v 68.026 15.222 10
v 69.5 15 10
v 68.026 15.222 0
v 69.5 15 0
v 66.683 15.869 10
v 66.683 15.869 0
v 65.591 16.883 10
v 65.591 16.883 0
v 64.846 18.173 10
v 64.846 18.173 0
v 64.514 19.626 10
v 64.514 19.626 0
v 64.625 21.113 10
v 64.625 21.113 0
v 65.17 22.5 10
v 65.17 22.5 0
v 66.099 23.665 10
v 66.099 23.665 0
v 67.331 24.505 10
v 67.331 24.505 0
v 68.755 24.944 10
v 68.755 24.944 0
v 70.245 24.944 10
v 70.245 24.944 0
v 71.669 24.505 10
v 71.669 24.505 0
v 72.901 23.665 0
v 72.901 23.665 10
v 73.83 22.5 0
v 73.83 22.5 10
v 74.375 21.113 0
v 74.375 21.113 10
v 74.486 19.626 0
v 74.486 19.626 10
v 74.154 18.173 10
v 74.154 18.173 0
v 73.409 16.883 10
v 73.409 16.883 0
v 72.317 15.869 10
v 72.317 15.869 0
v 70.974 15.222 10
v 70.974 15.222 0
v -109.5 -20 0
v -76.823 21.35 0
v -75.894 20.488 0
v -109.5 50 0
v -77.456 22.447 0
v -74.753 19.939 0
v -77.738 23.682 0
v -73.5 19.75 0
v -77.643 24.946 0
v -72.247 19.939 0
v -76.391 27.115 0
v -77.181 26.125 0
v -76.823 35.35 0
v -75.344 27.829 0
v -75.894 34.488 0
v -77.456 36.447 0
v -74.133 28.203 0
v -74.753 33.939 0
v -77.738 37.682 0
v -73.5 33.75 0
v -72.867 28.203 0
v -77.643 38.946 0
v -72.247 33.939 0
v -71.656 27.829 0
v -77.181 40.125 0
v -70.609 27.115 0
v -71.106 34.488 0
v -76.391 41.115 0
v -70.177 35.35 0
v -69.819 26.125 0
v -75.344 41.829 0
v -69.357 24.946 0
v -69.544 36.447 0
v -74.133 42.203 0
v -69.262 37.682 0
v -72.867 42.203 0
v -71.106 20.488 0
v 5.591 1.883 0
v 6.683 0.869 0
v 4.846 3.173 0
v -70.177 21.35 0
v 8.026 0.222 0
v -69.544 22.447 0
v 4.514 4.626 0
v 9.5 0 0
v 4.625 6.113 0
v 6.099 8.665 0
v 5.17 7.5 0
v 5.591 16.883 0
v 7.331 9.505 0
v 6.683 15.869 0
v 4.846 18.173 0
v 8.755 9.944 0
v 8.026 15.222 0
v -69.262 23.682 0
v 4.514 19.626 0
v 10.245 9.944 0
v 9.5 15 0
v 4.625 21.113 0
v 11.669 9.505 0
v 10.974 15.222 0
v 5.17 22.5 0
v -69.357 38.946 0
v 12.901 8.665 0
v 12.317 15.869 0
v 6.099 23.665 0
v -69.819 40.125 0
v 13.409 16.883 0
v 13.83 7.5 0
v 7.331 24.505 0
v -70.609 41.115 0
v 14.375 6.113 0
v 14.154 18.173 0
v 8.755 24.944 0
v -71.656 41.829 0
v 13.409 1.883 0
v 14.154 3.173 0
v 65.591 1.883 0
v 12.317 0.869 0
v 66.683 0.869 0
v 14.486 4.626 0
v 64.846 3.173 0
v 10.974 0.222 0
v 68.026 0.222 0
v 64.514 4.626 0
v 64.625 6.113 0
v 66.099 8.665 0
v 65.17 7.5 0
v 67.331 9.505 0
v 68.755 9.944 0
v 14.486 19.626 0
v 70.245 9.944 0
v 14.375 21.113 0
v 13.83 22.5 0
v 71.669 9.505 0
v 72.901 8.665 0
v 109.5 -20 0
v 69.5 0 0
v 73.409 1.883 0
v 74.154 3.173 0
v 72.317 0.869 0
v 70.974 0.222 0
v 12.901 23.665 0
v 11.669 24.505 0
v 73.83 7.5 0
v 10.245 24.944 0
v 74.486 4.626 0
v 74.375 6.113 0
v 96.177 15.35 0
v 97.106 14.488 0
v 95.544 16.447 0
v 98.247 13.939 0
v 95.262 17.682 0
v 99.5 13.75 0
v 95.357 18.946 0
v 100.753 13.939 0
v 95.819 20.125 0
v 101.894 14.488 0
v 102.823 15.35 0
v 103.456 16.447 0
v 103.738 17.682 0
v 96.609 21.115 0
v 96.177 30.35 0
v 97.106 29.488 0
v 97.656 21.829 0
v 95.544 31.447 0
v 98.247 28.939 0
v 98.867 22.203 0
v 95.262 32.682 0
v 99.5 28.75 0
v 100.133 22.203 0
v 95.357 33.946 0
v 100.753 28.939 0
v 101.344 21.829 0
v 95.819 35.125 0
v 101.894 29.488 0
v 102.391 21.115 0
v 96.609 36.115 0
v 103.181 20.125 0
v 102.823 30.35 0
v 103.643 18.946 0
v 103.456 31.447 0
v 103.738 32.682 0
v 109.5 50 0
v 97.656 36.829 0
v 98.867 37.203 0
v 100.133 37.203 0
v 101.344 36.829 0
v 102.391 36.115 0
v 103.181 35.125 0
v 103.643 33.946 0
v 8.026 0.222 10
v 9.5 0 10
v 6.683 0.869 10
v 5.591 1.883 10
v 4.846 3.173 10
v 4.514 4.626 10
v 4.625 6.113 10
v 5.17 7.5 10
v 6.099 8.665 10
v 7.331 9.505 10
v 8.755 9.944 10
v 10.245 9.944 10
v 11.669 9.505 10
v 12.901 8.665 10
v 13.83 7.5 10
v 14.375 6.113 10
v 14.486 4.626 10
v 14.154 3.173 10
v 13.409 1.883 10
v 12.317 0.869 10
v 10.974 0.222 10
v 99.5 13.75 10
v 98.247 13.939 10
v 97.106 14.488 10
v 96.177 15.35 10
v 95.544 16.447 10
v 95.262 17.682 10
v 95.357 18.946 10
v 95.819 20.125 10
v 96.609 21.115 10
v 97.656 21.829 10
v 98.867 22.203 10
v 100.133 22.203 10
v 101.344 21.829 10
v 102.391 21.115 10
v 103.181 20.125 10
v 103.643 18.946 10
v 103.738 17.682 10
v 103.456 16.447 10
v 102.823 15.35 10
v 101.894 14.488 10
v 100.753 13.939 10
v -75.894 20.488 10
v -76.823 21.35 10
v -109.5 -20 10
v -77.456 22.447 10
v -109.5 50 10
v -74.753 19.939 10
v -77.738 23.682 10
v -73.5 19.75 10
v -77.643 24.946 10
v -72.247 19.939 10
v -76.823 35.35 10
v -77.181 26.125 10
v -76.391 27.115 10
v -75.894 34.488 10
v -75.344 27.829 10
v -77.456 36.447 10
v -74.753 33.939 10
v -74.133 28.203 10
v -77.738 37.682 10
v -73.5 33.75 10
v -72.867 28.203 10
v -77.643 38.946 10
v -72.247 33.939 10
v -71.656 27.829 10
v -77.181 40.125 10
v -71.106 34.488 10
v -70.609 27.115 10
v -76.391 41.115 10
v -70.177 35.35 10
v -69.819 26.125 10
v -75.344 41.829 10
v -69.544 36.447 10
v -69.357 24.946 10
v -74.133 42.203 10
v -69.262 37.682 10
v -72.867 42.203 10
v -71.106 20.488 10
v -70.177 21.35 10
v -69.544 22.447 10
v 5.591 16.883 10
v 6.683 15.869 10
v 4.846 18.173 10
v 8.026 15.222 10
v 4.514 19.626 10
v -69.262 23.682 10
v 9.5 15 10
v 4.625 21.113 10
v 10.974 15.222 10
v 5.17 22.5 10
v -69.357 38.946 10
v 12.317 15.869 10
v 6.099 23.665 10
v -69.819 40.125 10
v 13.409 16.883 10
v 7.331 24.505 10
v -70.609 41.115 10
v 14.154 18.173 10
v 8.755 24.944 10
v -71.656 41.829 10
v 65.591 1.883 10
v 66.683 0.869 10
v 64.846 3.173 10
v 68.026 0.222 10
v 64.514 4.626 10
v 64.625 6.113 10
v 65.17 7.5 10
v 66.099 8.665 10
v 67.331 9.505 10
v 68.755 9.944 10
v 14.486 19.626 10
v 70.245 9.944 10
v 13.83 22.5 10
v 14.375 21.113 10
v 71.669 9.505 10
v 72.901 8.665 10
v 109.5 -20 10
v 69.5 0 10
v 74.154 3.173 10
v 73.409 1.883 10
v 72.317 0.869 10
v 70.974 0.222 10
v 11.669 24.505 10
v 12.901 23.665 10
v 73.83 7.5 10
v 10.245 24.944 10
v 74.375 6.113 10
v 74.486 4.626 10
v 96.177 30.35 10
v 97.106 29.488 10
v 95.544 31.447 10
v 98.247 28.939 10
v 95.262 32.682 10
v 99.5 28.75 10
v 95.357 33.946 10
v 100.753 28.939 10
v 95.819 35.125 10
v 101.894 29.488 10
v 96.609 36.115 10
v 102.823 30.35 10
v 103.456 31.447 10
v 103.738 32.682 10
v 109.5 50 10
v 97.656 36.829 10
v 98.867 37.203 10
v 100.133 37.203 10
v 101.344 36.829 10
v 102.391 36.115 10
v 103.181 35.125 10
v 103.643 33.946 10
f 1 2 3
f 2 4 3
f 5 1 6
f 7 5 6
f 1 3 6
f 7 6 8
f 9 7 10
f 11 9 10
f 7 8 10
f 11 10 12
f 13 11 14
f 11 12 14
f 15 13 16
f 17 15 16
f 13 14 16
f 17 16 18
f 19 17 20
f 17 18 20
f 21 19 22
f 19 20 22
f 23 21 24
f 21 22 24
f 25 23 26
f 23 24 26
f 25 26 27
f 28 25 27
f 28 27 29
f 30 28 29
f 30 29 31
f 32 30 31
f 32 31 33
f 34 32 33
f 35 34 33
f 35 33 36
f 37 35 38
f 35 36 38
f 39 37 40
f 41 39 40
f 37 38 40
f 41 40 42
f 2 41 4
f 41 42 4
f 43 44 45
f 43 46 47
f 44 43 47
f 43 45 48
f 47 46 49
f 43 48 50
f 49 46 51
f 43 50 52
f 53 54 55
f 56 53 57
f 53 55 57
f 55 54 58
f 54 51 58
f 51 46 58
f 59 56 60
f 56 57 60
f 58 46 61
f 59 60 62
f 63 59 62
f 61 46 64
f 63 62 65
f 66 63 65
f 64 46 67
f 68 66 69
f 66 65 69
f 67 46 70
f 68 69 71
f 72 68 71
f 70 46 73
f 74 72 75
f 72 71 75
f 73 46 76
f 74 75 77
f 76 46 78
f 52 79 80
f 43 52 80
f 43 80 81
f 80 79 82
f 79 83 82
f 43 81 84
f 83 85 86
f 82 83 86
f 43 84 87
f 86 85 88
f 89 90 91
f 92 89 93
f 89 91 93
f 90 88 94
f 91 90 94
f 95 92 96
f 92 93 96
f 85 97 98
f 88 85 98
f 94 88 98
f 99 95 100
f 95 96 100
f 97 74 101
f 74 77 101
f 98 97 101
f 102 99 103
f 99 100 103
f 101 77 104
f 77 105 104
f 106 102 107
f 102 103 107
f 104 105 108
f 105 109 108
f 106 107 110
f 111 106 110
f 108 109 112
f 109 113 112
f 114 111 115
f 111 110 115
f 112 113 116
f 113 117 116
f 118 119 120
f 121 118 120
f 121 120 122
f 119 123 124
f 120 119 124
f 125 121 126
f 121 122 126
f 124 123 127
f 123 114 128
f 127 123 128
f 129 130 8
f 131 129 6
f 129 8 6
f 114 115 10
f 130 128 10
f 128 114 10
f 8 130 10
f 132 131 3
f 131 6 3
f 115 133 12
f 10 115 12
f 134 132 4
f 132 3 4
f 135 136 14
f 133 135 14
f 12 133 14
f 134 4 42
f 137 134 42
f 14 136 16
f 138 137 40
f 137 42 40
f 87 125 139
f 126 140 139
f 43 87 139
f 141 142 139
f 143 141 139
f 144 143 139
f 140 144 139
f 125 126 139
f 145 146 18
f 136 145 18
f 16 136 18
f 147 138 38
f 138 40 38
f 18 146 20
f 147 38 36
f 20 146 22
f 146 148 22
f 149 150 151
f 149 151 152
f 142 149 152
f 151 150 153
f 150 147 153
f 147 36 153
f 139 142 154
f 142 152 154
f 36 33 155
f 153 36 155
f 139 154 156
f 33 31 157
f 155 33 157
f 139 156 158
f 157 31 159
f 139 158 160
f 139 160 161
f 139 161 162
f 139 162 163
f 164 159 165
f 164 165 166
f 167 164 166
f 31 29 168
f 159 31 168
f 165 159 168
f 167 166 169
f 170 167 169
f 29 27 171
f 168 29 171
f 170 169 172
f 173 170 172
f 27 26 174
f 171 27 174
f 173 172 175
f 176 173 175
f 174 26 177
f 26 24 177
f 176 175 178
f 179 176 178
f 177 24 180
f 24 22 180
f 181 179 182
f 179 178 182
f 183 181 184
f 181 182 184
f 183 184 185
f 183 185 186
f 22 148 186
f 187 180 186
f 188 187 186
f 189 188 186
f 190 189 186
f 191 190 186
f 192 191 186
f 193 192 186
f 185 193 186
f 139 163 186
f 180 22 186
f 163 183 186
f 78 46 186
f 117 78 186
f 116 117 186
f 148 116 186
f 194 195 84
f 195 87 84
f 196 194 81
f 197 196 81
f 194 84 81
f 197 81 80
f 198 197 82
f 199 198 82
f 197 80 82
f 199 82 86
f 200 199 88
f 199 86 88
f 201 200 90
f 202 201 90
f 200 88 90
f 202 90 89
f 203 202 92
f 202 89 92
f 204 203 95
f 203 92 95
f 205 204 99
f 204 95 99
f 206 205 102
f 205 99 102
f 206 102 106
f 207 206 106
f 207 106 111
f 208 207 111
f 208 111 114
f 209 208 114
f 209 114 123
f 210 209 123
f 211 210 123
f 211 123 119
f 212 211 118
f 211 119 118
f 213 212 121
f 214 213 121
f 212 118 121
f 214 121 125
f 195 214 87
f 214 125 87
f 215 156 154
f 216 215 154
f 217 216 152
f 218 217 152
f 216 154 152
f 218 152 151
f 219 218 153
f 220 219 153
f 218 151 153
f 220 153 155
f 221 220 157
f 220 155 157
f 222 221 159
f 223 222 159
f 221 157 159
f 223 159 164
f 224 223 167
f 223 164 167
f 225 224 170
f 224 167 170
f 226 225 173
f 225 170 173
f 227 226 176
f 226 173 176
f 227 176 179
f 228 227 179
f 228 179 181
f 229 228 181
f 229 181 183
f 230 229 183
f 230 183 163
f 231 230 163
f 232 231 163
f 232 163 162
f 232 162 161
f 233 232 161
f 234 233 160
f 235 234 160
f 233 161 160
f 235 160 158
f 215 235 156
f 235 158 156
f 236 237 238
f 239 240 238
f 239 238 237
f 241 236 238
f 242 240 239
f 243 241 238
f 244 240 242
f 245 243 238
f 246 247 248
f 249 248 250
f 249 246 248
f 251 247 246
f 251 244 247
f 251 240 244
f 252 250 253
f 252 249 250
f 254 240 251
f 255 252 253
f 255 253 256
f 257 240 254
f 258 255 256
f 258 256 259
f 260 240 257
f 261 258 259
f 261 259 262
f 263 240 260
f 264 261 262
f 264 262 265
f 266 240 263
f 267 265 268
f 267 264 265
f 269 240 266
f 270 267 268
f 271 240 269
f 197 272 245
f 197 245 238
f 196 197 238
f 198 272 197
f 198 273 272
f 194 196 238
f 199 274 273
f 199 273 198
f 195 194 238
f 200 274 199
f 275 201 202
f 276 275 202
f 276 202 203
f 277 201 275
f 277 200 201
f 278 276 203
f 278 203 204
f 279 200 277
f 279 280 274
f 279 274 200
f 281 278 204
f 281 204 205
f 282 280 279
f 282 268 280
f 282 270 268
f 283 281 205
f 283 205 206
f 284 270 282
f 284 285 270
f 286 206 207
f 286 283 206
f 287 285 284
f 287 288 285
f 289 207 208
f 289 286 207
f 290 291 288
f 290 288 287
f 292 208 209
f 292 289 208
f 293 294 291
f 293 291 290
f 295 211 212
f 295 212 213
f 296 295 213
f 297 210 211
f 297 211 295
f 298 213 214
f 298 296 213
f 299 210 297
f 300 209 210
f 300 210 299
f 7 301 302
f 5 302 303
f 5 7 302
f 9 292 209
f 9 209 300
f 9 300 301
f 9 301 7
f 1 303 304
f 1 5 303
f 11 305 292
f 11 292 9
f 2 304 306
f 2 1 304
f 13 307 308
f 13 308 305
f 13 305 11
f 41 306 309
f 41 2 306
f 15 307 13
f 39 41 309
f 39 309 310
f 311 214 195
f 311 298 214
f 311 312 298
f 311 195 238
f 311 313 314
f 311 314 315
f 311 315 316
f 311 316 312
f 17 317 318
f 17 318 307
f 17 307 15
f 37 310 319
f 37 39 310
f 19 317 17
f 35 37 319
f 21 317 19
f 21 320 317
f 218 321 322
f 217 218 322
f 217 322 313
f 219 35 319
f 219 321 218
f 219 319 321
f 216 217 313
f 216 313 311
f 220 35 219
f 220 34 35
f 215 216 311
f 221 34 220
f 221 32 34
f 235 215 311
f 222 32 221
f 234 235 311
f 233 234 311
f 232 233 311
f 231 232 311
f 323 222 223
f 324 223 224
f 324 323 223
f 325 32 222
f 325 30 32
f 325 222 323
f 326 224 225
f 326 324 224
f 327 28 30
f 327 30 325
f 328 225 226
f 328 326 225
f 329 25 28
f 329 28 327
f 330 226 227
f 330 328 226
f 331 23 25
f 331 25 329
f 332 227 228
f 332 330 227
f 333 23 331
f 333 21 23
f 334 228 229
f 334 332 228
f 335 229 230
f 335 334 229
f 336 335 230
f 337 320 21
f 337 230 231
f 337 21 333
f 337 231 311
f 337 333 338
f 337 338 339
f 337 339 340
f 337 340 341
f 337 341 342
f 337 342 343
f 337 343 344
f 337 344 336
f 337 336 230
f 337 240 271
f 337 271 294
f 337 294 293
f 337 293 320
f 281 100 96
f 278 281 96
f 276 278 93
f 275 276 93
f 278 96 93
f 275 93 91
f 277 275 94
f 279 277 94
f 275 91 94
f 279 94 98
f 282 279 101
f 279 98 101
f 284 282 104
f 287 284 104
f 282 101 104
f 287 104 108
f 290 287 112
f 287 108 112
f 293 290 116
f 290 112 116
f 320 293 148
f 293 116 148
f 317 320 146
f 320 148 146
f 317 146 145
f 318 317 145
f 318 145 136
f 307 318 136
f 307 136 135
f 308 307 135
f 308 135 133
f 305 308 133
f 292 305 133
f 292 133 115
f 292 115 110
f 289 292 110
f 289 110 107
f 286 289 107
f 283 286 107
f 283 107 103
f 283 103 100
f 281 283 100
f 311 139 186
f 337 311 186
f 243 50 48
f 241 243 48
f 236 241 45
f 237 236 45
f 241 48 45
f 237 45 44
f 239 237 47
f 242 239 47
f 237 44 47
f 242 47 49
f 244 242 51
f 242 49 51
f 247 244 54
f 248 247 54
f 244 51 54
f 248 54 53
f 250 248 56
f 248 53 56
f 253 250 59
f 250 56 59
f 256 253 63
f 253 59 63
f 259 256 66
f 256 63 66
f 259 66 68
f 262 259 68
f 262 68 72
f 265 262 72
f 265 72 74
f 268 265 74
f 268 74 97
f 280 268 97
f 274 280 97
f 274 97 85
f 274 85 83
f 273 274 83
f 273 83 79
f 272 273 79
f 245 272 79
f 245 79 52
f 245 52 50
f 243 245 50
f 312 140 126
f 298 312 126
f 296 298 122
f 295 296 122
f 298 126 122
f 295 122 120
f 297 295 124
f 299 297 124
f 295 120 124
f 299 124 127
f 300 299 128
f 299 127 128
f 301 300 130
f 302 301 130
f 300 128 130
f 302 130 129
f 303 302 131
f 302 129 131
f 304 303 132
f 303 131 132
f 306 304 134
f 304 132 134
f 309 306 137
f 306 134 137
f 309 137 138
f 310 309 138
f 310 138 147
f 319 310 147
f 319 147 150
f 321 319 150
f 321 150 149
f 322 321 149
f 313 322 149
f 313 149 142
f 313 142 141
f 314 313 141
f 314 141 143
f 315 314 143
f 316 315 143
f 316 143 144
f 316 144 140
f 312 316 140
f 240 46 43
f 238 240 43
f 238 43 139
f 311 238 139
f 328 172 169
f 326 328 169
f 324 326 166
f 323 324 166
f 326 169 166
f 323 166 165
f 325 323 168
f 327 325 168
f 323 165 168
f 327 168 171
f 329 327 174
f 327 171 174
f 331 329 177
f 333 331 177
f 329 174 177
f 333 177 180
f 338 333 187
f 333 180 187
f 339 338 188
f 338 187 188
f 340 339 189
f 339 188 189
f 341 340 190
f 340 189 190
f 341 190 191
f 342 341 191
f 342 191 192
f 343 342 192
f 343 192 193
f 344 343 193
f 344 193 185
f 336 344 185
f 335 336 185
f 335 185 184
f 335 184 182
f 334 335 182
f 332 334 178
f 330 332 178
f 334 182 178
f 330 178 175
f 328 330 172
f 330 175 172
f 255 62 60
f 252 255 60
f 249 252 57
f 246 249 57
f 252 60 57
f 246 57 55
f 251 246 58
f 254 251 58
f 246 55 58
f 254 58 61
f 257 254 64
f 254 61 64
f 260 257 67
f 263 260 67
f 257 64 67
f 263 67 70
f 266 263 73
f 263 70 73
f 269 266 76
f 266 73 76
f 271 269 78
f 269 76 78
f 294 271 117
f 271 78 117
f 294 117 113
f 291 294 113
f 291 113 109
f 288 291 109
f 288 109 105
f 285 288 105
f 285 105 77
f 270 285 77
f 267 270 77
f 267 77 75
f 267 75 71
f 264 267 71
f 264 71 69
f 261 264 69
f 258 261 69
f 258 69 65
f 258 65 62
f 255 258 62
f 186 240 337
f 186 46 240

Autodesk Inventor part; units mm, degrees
ref_plane "YZ Plane" through (0, 0, 0) normal (1, 0, 0) x (0, 1, 0)
ref_plane "XZ Plane" through (0, 0, 0) normal (0, 1, 0) x (-1, 0, 0)
ref_plane "XY Plane" through (0, 0, 0) normal (0, 0, 1) x (1, 0, 0)
sketch "Sketch1" plane through (0, 0, 0) normal (0, 0, 1) x (1, 0, 0)
  line L0 (-109.5, 50) -> (109.5, 50)
  line L1 (109.5, 50) -> (-109.5, 50)
  line L2 (-109.5, 50) -> (-109.5, -20)
  line L3 (-109.5, -20) -> (109.5, -20)
  line L4 (109.5, -20) -> (109.5, 50)
  dimension "d81" = 219
  dimension "d82" = 70
  dimension "d83" = 90
  dimension "d84" = 219
extrude "Extrusion1" add sketch "Sketch1" along normal blind 10
sketch "Sketch7" plane through (0, 0, 10) normal (0, 0, 1) x (1, 0, 0)
  line L0 (109.5, -50) -> (109.5, 50) projected
  line L1 (109.5, 50) -> (109.5, 18)
  line L2 (109.5, 18) -> (99.5, 18)
  line L3 (109.5, 50) -> (87.5, 50) projected
  line L4 (99.5, 50) -> (99.5, 33)
  line L5 (-109.5, 50) -> (-109.5, -50) projected
  line L6 (-109.5, 50) -> (-73.5, 50) construction
  line L7 (109.5, 50) -> (-109.5, 50) projected
  line L8 (-109.5, 50) -> (-73.5, 50)
  line L9 (-73.5, 50) -> (-73.5, 38)
  line L10 (-73.5, 38) -> (-73.5, 24)
  line L11 (87.5, 50) -> (87.5, -50) projected
  dimension "d32" = 32
  dimension "d34" = 10
  dimension "d36" = 17
  dimension "d37" = 10
  dimension "d41" = 36
  dimension "d42" = 12
  dimension "d43" = 14
hole "Hole1" at (99.5, 33, 10) at (99.5, 18, 10) at (-73.5, 24, 10) at (-73.5, 38, 10) direction (0, 0, -1) diameter 8.5 end through all
sketch "Sketch8" plane through (0, 0, 10) normal (0, 0, 1) x (1, 0, 0)
  line L0 (109.5, -50) -> (109.5, 50) projected
  line L1 (109.5, 50) -> (109.5, 20)
  line L2 (109.5, 20) -> (109.5, 5)
  line L3 (109.5, 5) -> (69.5, 5)
  line L4 (69.5, 5) -> (9.5, 5)
  line L5 (9.5, 5) -> (9.5, 20)
  line L6 (69.5, 5) -> (69.5, 20)
  point P0 (0, 0)
  dimension "d58" = 30
  dimension "d59" = 15
  dimension "d60" = 40
  dimension "d61" = 60
  dimension "d62" = 15
  dimension "d70" = 15
hole "Hole2" at (9.5, 5, 10) at (9.5, 20, 10) at (69.5, 5, 10) at (69.5, 20, 10) direction (0, 0, -1) diameter 10 end through all
thread "Thread1" size "M10x1.5" class "6H" standard "ISO Metric profile" full length
thread "Thread2" size "M10x1.5" class "6H" standard "ANSI Metric M Profile" full length
thread "Thread3" size "M10x1.5" class "6H" standard "ANSI Metric M Profile" full length
thread "Thread4" size "M10x1.5" class "6H" standard "ANSI Metric M Profile" full length
equation "\"d49\" = Thickness"
equation "\"d68\" = Thickness"
equation "\"BendRadius\" = Thickness"
equation "\"BendReliefWidth\" = Thickness"
equation "\"BendReliefDepth\" = 0.5 * Thickness"
equation "\"CornerReliefSize\" = 4 * Thickness"
equation "\"MinimumRemnant\" = 2 * Thickness"
equation "\"TransitionRadius\" = BendRadius"
equation "\"JacobiRadiusSize\" = Thickness"
equation "\"GapSize\" = Thickness"
equation "\"Thickness\" = 0.5"
properties part number "Ball screw right hand support" material "Steel"
